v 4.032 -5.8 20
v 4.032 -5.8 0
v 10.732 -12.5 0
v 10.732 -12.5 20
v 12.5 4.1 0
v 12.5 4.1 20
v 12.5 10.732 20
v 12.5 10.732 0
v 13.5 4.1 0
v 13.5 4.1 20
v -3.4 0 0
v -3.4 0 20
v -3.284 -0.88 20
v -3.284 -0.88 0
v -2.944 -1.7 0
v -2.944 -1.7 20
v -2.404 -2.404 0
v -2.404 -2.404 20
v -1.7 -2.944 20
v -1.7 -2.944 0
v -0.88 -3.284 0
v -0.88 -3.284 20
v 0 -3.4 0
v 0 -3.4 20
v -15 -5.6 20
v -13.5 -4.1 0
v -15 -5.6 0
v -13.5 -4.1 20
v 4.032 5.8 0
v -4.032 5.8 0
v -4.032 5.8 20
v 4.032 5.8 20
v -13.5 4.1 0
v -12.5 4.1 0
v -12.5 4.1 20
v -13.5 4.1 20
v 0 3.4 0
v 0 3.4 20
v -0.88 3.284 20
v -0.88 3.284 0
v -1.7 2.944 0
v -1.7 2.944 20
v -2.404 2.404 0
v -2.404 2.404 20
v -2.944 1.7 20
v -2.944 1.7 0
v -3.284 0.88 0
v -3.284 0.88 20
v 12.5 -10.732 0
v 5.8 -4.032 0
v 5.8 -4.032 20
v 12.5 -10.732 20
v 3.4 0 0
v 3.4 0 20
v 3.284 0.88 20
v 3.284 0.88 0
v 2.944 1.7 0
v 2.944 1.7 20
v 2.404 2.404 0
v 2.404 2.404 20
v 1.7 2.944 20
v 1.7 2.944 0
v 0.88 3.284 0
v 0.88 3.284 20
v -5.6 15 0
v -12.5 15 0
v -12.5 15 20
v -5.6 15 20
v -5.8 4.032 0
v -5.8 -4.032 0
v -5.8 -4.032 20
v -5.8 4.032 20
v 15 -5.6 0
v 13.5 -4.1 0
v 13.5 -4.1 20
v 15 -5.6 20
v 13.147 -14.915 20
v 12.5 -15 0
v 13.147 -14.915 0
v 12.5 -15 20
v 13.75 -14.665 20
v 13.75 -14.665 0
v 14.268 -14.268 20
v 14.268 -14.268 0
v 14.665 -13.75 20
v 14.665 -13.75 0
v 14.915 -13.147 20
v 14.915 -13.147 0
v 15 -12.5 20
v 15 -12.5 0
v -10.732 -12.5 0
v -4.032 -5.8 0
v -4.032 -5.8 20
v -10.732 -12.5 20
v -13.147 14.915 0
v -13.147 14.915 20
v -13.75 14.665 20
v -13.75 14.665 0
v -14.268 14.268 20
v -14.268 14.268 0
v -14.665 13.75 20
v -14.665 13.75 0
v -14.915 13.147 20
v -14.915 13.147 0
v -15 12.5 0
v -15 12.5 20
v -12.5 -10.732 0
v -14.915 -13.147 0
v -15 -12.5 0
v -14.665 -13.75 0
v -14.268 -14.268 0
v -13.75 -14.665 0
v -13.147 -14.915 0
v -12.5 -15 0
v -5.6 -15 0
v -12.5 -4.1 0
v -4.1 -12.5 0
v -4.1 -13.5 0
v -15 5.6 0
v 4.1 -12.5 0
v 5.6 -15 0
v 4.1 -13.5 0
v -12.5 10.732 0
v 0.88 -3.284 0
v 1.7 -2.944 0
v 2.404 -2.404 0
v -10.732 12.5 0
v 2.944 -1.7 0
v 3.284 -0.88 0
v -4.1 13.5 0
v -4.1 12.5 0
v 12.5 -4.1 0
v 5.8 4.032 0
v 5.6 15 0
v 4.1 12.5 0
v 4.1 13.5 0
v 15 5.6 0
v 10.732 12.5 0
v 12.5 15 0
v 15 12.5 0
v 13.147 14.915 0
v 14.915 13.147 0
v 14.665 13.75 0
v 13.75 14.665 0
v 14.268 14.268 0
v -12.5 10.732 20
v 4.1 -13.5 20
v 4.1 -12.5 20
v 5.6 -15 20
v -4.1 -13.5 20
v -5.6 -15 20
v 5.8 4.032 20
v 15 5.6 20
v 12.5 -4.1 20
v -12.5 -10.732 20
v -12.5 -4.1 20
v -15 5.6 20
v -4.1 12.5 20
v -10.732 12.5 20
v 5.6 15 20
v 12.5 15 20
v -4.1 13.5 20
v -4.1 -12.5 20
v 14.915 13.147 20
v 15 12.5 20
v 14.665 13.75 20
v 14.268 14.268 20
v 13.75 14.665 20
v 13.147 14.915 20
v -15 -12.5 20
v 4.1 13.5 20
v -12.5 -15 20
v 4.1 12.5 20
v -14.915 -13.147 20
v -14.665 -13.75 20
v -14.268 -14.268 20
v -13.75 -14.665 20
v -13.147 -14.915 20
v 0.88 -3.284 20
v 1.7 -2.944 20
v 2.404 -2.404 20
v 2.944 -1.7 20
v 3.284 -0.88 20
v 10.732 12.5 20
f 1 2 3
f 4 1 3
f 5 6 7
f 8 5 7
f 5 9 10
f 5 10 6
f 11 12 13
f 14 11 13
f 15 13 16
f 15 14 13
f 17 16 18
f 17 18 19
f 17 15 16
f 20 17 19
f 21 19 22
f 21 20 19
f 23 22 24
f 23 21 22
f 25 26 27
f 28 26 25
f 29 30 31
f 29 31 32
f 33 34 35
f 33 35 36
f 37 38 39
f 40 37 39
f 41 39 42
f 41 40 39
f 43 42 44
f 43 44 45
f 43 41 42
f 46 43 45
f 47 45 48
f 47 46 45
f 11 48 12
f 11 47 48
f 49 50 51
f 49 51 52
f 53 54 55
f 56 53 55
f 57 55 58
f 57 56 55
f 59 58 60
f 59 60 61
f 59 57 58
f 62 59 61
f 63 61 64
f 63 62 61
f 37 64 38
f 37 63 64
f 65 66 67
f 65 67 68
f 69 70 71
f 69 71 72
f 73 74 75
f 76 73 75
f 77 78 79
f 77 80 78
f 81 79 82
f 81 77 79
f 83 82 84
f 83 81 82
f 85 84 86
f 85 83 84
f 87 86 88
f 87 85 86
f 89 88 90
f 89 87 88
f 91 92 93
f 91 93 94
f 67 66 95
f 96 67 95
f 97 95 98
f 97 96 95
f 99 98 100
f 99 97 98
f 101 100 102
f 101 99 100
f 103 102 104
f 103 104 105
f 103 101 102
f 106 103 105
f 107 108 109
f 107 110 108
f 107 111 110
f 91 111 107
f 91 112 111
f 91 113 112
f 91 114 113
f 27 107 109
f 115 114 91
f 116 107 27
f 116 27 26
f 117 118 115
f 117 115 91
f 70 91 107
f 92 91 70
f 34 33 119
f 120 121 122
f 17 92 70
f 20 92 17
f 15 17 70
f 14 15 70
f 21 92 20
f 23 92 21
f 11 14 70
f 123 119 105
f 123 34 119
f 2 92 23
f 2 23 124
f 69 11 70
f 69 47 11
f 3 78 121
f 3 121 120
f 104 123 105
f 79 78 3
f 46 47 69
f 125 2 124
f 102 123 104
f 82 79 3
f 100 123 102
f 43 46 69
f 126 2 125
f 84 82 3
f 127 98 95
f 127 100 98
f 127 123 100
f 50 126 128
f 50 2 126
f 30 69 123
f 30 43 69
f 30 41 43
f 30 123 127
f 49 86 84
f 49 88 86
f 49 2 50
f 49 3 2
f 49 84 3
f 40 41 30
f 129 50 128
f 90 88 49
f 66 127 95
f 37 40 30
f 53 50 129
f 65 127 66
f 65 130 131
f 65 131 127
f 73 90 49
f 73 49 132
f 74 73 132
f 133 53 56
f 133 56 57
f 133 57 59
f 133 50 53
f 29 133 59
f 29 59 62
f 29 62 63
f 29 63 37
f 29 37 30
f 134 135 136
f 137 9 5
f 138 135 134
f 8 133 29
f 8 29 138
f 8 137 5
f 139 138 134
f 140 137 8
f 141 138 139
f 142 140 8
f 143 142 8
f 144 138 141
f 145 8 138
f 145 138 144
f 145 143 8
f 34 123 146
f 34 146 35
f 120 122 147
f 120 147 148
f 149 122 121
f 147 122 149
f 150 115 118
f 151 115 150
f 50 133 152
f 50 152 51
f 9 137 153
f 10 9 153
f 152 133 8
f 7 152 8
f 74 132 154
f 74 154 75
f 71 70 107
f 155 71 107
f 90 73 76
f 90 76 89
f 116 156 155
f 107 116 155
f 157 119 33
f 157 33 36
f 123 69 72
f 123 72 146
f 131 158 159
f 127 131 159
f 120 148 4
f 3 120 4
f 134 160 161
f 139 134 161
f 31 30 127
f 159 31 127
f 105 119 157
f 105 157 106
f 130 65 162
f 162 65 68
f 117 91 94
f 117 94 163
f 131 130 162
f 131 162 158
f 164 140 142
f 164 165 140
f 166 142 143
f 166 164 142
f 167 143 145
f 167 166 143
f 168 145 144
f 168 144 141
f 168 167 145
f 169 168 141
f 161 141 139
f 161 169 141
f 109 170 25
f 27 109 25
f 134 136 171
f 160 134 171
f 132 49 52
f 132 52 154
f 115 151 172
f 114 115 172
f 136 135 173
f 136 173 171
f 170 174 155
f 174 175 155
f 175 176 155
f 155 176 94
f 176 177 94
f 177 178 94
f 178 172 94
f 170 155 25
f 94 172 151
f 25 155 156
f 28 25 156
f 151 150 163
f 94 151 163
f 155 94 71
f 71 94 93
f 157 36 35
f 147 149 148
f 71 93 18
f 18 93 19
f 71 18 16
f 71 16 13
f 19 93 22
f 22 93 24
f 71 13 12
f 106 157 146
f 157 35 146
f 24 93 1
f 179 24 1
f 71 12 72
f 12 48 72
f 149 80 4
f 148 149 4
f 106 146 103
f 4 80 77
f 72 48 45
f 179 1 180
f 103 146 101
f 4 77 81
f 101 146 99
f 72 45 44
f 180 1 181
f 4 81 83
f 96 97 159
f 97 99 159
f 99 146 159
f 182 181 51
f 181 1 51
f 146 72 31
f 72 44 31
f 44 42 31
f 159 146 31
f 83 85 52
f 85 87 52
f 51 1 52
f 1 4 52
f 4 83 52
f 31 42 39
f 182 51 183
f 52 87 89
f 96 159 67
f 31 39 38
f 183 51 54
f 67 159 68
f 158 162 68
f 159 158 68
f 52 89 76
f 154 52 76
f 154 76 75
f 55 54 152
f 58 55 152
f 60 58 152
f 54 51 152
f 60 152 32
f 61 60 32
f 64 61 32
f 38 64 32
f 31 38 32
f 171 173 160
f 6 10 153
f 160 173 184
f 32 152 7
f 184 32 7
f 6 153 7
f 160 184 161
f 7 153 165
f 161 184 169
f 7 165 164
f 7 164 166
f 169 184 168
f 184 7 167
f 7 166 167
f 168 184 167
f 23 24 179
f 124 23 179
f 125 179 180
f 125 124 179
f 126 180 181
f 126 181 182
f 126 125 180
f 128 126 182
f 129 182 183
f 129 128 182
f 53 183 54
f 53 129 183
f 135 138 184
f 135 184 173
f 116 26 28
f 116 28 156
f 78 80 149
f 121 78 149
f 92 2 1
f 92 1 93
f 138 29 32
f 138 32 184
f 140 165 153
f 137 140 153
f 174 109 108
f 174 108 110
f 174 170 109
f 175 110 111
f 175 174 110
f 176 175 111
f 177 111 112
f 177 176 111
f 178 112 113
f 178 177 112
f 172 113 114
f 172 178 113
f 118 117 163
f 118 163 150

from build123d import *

# Parameters (mm, degrees)
PAD_DEPTH            = 20
POLARPATTERN_COUNT   = 4
FILLET_R             = 2.5
CHAMFER_SIZE         = 1.5
BODY_PLACEMENT_ANGLE = 270


with BuildPart() as part:
    # Sketch → Pad (new body)
    with BuildSketch(Plane.XZ):
        with BuildLine():
            Line((0, 5.8), (4.032233, 5.8))
            Line((4.032233, 5.8), (10.732233, 12.5))
            Line((10.732233, 12.5), (4.1, 12.5))
            Line((4.1, 12.5), (4.1, 15))
            Line((4.1, 15), (15, 15))
            Line((15, 15), (15, 4.1))
            Line((15, 4.1), (12.5, 4.1))
            Line((12.5, 4.1), (12.5, 10.732233))
            Line((5.8, 4.032233), (12.5, 10.732233))
            Line((5.8, 4.032233), (5.8, 0))
            Line((3.4, 0), (5.8, 0))
            ThreePointArc((3.4, 0), (2.404163, 2.404163), (0, 3.4))
            Line((0, 5.8), (0, 3.4))
        make_face()
    pad = extrude(amount=PAD_DEPTH)

    # PolarPattern: Pad ×4 about axis
    polarpattern_axis = Axis((0, 0, 0), (0, -1, 0))
    for i in range(1, POLARPATTERN_COUNT):
        add(pad.rotate(polarpattern_axis, i * 360 / POLARPATTERN_COUNT))

    # Fillet
    fillet_edges = [part.edges().sort_by_distance(p)[0] for p in [
        (-15, -10, 15),
        (15, -10, 15),
        (15, -10, -15),
        (-15, -10, -15),
    ]]
    fillet(fillet_edges, radius=FILLET_R)

    # Chamfer
    chamfer_edges = [part.edges().sort_by_distance(p)[0] for p in [
        (4.1, -10, 15),
        (-4.1, -10, 15),
        (-15, -10, 4.1),
        (-15, -10, -4.1),
        (-4.1, -10, -15),
        (15, -10, -4.1),
        (4.1, -10, -15),
        (15, -10, 4.1),
    ]]
    chamfer(chamfer_edges, length=CHAMFER_SIZE)


with BuildPart() as part_1:
    # Body placement: moved
    add(part.part.rotate(Axis((0, 0, 0), (1, 0, 0)), BODY_PLACEMENT_ANGLE))


solid = part_1.part
